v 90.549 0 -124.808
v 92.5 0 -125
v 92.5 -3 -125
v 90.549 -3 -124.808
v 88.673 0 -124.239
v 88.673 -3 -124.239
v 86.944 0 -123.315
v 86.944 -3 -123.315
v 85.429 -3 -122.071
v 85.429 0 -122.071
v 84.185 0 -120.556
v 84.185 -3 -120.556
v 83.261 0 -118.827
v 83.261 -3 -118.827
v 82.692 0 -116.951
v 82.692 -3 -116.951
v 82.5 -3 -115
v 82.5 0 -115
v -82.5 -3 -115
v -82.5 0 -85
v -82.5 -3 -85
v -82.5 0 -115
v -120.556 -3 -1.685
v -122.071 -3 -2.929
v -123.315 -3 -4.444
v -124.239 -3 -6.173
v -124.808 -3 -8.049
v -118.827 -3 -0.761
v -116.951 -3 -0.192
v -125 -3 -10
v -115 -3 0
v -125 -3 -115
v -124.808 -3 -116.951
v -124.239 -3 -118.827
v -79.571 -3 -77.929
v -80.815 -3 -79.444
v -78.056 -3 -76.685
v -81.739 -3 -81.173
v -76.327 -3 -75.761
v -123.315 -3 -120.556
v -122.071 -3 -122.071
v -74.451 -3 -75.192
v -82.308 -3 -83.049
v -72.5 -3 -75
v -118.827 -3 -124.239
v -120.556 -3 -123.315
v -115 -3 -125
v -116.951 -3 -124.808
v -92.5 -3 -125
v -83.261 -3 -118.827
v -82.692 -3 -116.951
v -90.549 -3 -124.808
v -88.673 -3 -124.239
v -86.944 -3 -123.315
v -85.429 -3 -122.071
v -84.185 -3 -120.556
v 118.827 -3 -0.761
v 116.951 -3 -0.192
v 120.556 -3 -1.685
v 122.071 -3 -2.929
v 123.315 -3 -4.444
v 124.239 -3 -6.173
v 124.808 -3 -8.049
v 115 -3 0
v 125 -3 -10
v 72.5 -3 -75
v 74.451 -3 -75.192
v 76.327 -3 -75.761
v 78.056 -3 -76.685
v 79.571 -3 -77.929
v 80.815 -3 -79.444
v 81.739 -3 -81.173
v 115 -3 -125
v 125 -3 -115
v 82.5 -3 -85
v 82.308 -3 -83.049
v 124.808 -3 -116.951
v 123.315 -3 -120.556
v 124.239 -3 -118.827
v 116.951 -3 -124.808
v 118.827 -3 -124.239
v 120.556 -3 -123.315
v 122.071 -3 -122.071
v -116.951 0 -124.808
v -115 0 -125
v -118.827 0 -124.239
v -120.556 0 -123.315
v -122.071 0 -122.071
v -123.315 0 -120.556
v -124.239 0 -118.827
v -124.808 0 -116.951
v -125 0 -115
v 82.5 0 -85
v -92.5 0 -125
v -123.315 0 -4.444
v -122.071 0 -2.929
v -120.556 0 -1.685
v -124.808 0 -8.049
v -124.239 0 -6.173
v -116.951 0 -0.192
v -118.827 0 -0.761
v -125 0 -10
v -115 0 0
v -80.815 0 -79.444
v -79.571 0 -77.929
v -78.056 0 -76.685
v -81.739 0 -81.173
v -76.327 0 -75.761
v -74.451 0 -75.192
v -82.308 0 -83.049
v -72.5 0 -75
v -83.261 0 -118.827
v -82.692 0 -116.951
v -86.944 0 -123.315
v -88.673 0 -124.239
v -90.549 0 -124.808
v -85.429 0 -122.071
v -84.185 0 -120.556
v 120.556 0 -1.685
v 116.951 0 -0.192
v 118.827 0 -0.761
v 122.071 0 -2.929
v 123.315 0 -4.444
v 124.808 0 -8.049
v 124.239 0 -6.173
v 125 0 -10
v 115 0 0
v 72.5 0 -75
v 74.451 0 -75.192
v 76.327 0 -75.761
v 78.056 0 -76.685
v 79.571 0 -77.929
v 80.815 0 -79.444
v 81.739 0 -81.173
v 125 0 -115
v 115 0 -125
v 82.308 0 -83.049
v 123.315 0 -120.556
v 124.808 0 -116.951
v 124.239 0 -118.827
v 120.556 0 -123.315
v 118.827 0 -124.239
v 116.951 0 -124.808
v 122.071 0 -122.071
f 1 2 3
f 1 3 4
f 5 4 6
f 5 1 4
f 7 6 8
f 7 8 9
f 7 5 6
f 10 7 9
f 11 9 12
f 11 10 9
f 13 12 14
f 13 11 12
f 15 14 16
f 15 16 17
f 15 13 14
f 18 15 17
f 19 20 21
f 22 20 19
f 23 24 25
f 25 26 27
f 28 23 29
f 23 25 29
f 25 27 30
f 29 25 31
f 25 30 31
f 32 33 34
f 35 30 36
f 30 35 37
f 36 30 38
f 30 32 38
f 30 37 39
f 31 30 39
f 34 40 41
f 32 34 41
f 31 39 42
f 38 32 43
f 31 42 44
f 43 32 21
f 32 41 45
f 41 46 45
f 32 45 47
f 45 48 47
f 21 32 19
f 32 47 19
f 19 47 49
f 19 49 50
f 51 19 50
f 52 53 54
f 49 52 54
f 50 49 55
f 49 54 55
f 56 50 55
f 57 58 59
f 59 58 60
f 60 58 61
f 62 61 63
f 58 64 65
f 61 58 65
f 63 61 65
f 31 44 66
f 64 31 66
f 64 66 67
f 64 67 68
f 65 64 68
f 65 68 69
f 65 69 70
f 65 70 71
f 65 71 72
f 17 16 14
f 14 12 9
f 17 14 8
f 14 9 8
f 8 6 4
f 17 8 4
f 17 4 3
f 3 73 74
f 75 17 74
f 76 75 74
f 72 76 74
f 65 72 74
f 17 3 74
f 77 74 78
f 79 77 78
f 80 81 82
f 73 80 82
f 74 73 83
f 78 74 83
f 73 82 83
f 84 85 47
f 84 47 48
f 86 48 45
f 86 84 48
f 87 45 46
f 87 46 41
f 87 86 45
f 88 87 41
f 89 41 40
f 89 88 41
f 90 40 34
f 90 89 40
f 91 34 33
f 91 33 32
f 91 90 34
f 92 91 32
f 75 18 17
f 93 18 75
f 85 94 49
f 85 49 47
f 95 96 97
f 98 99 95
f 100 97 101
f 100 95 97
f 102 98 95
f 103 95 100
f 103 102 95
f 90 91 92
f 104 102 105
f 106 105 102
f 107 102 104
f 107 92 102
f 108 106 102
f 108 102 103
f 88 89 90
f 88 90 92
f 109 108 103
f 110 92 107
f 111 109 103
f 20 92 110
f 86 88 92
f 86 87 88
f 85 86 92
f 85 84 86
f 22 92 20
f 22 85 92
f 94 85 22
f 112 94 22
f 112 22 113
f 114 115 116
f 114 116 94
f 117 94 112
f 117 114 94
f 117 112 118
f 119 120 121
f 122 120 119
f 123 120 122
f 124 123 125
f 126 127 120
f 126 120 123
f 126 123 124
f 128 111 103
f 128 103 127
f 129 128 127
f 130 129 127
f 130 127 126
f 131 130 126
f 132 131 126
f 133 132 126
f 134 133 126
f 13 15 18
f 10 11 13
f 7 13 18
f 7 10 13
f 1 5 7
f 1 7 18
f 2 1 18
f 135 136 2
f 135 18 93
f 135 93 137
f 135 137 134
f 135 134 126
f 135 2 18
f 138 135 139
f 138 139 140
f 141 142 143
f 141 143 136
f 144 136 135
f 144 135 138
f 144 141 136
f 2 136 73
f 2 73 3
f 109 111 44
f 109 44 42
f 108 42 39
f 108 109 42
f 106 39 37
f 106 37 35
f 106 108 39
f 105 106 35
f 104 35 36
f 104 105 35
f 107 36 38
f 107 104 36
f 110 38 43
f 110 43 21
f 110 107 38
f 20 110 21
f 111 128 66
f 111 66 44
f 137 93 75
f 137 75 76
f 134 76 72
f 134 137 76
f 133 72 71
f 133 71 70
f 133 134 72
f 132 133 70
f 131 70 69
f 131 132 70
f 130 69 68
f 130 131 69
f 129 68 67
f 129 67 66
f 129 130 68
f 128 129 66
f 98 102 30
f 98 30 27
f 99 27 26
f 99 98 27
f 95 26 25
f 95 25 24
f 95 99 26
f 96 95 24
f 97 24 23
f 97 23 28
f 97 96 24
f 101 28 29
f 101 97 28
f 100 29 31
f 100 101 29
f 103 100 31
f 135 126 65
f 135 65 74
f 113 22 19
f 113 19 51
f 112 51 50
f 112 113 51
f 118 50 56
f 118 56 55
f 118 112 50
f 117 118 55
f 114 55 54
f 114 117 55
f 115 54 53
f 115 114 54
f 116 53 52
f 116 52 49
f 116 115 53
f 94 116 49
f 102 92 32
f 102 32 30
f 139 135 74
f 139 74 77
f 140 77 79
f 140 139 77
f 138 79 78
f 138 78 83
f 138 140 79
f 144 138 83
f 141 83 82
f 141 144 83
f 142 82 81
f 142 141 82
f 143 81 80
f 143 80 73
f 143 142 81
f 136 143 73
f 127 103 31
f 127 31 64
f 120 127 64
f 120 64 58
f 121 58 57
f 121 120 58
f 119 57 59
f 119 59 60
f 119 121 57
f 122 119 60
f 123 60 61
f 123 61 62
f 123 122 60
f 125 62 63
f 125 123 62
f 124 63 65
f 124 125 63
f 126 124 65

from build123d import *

# Parameters (mm, degrees)
BASE_FLANGE1_DEPTH = 3


# Sheet-metal steps are written as plain solids
with BuildPart() as part:
    # Sketch16 → Base-Flange1 (new body)
    with BuildSketch(Plane(origin=(0, 0, 0), x_dir=(1, 0, 0), z_dir=(0, 1, 0))):
        with BuildLine():
            Line((-50, 0), (50, 0))
            Line((50, 0), (115, 0))
            ThreePointArc((115, 0), (122.071067812, 2.928932188), (125, 10))
            Line((125, 10), (125, 75))
            Line((125, 75), (125, 115))
            ThreePointArc((125, 115), (122.071067812, 122.071067812), (115, 125))
            Line((115, 125), (92.5, 125))
            ThreePointArc((92.5, 125), (85.428932188, 122.071067812), (82.5, 115))
            Line((82.5, 115), (82.5, 85))
            ThreePointArc((82.5, 85), (79.571067812, 77.928932188), (72.5, 75))
            Line((72.5, 75), (50, 75))
            Line((50, 75), (-50, 75))
            Line((-50, 75), (-72.5, 75))
            ThreePointArc((-72.5, 75), (-79.571067812, 77.928932188), (-82.5, 85))
            Line((-82.5, 85), (-82.5, 115))
            ThreePointArc((-82.5, 115), (-85.428932188, 122.071067812), (-92.5, 125))
            Line((-92.5, 125), (-115, 125))
            ThreePointArc((-115, 125), (-122.071067812, 122.071067812), (-125, 115))
            Line((-125, 115), (-125, 75))
            Line((-125, 75), (-125, 10))
            ThreePointArc((-125, 10), (-122.071067812, 2.928932188), (-115, 0))
            Line((-115, 0), (-50, 0))
        make_face()
    extrude(amount=-BASE_FLANGE1_DEPTH)


solid = part.part
